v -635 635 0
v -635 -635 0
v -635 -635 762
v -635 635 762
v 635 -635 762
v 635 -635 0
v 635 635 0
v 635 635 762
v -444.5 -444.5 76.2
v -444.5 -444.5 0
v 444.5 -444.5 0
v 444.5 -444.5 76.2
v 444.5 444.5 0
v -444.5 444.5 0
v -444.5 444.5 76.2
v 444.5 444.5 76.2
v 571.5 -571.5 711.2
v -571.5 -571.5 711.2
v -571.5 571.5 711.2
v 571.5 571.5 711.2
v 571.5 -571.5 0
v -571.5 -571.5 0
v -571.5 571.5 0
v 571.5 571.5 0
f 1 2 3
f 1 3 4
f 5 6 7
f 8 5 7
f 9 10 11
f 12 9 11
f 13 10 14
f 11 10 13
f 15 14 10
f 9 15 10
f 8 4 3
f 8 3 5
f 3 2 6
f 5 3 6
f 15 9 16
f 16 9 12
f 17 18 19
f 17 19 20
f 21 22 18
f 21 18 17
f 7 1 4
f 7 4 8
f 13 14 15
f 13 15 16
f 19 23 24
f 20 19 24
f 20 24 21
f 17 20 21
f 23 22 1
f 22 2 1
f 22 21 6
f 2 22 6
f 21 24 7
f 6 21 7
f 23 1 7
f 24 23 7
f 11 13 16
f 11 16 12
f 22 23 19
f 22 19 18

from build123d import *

# Parameters (mm, degrees)
F0_W     = 1270
F0_H     = 1270
F1_DEPTH = 762
F2_W     = 1143
F2_H     = 1143
F3_DEPTH = 711.2
F4_W     = 889
F4_H     = 889
F5_DEPTH = 76.2


with BuildPart() as f1:
    # F0 (on Top) → F1 (new body)
    with BuildSketch(Plane.XY):
        Rectangle(F0_W, F0_H)
    extrude(amount=F1_DEPTH)

    # F2 (on face) → F3 (cut)
    with BuildSketch(Plane(origin=(0, 0, 0), x_dir=(1, 0, 0), z_dir=(0, 0, -1))):
        Rectangle(F2_W, F2_H)
    extrude(amount=-F3_DEPTH, mode=Mode.SUBTRACT)


with BuildPart() as f5:
    # F4 (on face) → F5 (new body)
    with BuildSketch(Plane(origin=(0, 0, 0), x_dir=(1, 0, 0), z_dir=(0, 0, -1))):
        Rectangle(F4_W, F4_H)
    extrude(amount=-F5_DEPTH)


solid = Compound([f1.part, f5.part])
